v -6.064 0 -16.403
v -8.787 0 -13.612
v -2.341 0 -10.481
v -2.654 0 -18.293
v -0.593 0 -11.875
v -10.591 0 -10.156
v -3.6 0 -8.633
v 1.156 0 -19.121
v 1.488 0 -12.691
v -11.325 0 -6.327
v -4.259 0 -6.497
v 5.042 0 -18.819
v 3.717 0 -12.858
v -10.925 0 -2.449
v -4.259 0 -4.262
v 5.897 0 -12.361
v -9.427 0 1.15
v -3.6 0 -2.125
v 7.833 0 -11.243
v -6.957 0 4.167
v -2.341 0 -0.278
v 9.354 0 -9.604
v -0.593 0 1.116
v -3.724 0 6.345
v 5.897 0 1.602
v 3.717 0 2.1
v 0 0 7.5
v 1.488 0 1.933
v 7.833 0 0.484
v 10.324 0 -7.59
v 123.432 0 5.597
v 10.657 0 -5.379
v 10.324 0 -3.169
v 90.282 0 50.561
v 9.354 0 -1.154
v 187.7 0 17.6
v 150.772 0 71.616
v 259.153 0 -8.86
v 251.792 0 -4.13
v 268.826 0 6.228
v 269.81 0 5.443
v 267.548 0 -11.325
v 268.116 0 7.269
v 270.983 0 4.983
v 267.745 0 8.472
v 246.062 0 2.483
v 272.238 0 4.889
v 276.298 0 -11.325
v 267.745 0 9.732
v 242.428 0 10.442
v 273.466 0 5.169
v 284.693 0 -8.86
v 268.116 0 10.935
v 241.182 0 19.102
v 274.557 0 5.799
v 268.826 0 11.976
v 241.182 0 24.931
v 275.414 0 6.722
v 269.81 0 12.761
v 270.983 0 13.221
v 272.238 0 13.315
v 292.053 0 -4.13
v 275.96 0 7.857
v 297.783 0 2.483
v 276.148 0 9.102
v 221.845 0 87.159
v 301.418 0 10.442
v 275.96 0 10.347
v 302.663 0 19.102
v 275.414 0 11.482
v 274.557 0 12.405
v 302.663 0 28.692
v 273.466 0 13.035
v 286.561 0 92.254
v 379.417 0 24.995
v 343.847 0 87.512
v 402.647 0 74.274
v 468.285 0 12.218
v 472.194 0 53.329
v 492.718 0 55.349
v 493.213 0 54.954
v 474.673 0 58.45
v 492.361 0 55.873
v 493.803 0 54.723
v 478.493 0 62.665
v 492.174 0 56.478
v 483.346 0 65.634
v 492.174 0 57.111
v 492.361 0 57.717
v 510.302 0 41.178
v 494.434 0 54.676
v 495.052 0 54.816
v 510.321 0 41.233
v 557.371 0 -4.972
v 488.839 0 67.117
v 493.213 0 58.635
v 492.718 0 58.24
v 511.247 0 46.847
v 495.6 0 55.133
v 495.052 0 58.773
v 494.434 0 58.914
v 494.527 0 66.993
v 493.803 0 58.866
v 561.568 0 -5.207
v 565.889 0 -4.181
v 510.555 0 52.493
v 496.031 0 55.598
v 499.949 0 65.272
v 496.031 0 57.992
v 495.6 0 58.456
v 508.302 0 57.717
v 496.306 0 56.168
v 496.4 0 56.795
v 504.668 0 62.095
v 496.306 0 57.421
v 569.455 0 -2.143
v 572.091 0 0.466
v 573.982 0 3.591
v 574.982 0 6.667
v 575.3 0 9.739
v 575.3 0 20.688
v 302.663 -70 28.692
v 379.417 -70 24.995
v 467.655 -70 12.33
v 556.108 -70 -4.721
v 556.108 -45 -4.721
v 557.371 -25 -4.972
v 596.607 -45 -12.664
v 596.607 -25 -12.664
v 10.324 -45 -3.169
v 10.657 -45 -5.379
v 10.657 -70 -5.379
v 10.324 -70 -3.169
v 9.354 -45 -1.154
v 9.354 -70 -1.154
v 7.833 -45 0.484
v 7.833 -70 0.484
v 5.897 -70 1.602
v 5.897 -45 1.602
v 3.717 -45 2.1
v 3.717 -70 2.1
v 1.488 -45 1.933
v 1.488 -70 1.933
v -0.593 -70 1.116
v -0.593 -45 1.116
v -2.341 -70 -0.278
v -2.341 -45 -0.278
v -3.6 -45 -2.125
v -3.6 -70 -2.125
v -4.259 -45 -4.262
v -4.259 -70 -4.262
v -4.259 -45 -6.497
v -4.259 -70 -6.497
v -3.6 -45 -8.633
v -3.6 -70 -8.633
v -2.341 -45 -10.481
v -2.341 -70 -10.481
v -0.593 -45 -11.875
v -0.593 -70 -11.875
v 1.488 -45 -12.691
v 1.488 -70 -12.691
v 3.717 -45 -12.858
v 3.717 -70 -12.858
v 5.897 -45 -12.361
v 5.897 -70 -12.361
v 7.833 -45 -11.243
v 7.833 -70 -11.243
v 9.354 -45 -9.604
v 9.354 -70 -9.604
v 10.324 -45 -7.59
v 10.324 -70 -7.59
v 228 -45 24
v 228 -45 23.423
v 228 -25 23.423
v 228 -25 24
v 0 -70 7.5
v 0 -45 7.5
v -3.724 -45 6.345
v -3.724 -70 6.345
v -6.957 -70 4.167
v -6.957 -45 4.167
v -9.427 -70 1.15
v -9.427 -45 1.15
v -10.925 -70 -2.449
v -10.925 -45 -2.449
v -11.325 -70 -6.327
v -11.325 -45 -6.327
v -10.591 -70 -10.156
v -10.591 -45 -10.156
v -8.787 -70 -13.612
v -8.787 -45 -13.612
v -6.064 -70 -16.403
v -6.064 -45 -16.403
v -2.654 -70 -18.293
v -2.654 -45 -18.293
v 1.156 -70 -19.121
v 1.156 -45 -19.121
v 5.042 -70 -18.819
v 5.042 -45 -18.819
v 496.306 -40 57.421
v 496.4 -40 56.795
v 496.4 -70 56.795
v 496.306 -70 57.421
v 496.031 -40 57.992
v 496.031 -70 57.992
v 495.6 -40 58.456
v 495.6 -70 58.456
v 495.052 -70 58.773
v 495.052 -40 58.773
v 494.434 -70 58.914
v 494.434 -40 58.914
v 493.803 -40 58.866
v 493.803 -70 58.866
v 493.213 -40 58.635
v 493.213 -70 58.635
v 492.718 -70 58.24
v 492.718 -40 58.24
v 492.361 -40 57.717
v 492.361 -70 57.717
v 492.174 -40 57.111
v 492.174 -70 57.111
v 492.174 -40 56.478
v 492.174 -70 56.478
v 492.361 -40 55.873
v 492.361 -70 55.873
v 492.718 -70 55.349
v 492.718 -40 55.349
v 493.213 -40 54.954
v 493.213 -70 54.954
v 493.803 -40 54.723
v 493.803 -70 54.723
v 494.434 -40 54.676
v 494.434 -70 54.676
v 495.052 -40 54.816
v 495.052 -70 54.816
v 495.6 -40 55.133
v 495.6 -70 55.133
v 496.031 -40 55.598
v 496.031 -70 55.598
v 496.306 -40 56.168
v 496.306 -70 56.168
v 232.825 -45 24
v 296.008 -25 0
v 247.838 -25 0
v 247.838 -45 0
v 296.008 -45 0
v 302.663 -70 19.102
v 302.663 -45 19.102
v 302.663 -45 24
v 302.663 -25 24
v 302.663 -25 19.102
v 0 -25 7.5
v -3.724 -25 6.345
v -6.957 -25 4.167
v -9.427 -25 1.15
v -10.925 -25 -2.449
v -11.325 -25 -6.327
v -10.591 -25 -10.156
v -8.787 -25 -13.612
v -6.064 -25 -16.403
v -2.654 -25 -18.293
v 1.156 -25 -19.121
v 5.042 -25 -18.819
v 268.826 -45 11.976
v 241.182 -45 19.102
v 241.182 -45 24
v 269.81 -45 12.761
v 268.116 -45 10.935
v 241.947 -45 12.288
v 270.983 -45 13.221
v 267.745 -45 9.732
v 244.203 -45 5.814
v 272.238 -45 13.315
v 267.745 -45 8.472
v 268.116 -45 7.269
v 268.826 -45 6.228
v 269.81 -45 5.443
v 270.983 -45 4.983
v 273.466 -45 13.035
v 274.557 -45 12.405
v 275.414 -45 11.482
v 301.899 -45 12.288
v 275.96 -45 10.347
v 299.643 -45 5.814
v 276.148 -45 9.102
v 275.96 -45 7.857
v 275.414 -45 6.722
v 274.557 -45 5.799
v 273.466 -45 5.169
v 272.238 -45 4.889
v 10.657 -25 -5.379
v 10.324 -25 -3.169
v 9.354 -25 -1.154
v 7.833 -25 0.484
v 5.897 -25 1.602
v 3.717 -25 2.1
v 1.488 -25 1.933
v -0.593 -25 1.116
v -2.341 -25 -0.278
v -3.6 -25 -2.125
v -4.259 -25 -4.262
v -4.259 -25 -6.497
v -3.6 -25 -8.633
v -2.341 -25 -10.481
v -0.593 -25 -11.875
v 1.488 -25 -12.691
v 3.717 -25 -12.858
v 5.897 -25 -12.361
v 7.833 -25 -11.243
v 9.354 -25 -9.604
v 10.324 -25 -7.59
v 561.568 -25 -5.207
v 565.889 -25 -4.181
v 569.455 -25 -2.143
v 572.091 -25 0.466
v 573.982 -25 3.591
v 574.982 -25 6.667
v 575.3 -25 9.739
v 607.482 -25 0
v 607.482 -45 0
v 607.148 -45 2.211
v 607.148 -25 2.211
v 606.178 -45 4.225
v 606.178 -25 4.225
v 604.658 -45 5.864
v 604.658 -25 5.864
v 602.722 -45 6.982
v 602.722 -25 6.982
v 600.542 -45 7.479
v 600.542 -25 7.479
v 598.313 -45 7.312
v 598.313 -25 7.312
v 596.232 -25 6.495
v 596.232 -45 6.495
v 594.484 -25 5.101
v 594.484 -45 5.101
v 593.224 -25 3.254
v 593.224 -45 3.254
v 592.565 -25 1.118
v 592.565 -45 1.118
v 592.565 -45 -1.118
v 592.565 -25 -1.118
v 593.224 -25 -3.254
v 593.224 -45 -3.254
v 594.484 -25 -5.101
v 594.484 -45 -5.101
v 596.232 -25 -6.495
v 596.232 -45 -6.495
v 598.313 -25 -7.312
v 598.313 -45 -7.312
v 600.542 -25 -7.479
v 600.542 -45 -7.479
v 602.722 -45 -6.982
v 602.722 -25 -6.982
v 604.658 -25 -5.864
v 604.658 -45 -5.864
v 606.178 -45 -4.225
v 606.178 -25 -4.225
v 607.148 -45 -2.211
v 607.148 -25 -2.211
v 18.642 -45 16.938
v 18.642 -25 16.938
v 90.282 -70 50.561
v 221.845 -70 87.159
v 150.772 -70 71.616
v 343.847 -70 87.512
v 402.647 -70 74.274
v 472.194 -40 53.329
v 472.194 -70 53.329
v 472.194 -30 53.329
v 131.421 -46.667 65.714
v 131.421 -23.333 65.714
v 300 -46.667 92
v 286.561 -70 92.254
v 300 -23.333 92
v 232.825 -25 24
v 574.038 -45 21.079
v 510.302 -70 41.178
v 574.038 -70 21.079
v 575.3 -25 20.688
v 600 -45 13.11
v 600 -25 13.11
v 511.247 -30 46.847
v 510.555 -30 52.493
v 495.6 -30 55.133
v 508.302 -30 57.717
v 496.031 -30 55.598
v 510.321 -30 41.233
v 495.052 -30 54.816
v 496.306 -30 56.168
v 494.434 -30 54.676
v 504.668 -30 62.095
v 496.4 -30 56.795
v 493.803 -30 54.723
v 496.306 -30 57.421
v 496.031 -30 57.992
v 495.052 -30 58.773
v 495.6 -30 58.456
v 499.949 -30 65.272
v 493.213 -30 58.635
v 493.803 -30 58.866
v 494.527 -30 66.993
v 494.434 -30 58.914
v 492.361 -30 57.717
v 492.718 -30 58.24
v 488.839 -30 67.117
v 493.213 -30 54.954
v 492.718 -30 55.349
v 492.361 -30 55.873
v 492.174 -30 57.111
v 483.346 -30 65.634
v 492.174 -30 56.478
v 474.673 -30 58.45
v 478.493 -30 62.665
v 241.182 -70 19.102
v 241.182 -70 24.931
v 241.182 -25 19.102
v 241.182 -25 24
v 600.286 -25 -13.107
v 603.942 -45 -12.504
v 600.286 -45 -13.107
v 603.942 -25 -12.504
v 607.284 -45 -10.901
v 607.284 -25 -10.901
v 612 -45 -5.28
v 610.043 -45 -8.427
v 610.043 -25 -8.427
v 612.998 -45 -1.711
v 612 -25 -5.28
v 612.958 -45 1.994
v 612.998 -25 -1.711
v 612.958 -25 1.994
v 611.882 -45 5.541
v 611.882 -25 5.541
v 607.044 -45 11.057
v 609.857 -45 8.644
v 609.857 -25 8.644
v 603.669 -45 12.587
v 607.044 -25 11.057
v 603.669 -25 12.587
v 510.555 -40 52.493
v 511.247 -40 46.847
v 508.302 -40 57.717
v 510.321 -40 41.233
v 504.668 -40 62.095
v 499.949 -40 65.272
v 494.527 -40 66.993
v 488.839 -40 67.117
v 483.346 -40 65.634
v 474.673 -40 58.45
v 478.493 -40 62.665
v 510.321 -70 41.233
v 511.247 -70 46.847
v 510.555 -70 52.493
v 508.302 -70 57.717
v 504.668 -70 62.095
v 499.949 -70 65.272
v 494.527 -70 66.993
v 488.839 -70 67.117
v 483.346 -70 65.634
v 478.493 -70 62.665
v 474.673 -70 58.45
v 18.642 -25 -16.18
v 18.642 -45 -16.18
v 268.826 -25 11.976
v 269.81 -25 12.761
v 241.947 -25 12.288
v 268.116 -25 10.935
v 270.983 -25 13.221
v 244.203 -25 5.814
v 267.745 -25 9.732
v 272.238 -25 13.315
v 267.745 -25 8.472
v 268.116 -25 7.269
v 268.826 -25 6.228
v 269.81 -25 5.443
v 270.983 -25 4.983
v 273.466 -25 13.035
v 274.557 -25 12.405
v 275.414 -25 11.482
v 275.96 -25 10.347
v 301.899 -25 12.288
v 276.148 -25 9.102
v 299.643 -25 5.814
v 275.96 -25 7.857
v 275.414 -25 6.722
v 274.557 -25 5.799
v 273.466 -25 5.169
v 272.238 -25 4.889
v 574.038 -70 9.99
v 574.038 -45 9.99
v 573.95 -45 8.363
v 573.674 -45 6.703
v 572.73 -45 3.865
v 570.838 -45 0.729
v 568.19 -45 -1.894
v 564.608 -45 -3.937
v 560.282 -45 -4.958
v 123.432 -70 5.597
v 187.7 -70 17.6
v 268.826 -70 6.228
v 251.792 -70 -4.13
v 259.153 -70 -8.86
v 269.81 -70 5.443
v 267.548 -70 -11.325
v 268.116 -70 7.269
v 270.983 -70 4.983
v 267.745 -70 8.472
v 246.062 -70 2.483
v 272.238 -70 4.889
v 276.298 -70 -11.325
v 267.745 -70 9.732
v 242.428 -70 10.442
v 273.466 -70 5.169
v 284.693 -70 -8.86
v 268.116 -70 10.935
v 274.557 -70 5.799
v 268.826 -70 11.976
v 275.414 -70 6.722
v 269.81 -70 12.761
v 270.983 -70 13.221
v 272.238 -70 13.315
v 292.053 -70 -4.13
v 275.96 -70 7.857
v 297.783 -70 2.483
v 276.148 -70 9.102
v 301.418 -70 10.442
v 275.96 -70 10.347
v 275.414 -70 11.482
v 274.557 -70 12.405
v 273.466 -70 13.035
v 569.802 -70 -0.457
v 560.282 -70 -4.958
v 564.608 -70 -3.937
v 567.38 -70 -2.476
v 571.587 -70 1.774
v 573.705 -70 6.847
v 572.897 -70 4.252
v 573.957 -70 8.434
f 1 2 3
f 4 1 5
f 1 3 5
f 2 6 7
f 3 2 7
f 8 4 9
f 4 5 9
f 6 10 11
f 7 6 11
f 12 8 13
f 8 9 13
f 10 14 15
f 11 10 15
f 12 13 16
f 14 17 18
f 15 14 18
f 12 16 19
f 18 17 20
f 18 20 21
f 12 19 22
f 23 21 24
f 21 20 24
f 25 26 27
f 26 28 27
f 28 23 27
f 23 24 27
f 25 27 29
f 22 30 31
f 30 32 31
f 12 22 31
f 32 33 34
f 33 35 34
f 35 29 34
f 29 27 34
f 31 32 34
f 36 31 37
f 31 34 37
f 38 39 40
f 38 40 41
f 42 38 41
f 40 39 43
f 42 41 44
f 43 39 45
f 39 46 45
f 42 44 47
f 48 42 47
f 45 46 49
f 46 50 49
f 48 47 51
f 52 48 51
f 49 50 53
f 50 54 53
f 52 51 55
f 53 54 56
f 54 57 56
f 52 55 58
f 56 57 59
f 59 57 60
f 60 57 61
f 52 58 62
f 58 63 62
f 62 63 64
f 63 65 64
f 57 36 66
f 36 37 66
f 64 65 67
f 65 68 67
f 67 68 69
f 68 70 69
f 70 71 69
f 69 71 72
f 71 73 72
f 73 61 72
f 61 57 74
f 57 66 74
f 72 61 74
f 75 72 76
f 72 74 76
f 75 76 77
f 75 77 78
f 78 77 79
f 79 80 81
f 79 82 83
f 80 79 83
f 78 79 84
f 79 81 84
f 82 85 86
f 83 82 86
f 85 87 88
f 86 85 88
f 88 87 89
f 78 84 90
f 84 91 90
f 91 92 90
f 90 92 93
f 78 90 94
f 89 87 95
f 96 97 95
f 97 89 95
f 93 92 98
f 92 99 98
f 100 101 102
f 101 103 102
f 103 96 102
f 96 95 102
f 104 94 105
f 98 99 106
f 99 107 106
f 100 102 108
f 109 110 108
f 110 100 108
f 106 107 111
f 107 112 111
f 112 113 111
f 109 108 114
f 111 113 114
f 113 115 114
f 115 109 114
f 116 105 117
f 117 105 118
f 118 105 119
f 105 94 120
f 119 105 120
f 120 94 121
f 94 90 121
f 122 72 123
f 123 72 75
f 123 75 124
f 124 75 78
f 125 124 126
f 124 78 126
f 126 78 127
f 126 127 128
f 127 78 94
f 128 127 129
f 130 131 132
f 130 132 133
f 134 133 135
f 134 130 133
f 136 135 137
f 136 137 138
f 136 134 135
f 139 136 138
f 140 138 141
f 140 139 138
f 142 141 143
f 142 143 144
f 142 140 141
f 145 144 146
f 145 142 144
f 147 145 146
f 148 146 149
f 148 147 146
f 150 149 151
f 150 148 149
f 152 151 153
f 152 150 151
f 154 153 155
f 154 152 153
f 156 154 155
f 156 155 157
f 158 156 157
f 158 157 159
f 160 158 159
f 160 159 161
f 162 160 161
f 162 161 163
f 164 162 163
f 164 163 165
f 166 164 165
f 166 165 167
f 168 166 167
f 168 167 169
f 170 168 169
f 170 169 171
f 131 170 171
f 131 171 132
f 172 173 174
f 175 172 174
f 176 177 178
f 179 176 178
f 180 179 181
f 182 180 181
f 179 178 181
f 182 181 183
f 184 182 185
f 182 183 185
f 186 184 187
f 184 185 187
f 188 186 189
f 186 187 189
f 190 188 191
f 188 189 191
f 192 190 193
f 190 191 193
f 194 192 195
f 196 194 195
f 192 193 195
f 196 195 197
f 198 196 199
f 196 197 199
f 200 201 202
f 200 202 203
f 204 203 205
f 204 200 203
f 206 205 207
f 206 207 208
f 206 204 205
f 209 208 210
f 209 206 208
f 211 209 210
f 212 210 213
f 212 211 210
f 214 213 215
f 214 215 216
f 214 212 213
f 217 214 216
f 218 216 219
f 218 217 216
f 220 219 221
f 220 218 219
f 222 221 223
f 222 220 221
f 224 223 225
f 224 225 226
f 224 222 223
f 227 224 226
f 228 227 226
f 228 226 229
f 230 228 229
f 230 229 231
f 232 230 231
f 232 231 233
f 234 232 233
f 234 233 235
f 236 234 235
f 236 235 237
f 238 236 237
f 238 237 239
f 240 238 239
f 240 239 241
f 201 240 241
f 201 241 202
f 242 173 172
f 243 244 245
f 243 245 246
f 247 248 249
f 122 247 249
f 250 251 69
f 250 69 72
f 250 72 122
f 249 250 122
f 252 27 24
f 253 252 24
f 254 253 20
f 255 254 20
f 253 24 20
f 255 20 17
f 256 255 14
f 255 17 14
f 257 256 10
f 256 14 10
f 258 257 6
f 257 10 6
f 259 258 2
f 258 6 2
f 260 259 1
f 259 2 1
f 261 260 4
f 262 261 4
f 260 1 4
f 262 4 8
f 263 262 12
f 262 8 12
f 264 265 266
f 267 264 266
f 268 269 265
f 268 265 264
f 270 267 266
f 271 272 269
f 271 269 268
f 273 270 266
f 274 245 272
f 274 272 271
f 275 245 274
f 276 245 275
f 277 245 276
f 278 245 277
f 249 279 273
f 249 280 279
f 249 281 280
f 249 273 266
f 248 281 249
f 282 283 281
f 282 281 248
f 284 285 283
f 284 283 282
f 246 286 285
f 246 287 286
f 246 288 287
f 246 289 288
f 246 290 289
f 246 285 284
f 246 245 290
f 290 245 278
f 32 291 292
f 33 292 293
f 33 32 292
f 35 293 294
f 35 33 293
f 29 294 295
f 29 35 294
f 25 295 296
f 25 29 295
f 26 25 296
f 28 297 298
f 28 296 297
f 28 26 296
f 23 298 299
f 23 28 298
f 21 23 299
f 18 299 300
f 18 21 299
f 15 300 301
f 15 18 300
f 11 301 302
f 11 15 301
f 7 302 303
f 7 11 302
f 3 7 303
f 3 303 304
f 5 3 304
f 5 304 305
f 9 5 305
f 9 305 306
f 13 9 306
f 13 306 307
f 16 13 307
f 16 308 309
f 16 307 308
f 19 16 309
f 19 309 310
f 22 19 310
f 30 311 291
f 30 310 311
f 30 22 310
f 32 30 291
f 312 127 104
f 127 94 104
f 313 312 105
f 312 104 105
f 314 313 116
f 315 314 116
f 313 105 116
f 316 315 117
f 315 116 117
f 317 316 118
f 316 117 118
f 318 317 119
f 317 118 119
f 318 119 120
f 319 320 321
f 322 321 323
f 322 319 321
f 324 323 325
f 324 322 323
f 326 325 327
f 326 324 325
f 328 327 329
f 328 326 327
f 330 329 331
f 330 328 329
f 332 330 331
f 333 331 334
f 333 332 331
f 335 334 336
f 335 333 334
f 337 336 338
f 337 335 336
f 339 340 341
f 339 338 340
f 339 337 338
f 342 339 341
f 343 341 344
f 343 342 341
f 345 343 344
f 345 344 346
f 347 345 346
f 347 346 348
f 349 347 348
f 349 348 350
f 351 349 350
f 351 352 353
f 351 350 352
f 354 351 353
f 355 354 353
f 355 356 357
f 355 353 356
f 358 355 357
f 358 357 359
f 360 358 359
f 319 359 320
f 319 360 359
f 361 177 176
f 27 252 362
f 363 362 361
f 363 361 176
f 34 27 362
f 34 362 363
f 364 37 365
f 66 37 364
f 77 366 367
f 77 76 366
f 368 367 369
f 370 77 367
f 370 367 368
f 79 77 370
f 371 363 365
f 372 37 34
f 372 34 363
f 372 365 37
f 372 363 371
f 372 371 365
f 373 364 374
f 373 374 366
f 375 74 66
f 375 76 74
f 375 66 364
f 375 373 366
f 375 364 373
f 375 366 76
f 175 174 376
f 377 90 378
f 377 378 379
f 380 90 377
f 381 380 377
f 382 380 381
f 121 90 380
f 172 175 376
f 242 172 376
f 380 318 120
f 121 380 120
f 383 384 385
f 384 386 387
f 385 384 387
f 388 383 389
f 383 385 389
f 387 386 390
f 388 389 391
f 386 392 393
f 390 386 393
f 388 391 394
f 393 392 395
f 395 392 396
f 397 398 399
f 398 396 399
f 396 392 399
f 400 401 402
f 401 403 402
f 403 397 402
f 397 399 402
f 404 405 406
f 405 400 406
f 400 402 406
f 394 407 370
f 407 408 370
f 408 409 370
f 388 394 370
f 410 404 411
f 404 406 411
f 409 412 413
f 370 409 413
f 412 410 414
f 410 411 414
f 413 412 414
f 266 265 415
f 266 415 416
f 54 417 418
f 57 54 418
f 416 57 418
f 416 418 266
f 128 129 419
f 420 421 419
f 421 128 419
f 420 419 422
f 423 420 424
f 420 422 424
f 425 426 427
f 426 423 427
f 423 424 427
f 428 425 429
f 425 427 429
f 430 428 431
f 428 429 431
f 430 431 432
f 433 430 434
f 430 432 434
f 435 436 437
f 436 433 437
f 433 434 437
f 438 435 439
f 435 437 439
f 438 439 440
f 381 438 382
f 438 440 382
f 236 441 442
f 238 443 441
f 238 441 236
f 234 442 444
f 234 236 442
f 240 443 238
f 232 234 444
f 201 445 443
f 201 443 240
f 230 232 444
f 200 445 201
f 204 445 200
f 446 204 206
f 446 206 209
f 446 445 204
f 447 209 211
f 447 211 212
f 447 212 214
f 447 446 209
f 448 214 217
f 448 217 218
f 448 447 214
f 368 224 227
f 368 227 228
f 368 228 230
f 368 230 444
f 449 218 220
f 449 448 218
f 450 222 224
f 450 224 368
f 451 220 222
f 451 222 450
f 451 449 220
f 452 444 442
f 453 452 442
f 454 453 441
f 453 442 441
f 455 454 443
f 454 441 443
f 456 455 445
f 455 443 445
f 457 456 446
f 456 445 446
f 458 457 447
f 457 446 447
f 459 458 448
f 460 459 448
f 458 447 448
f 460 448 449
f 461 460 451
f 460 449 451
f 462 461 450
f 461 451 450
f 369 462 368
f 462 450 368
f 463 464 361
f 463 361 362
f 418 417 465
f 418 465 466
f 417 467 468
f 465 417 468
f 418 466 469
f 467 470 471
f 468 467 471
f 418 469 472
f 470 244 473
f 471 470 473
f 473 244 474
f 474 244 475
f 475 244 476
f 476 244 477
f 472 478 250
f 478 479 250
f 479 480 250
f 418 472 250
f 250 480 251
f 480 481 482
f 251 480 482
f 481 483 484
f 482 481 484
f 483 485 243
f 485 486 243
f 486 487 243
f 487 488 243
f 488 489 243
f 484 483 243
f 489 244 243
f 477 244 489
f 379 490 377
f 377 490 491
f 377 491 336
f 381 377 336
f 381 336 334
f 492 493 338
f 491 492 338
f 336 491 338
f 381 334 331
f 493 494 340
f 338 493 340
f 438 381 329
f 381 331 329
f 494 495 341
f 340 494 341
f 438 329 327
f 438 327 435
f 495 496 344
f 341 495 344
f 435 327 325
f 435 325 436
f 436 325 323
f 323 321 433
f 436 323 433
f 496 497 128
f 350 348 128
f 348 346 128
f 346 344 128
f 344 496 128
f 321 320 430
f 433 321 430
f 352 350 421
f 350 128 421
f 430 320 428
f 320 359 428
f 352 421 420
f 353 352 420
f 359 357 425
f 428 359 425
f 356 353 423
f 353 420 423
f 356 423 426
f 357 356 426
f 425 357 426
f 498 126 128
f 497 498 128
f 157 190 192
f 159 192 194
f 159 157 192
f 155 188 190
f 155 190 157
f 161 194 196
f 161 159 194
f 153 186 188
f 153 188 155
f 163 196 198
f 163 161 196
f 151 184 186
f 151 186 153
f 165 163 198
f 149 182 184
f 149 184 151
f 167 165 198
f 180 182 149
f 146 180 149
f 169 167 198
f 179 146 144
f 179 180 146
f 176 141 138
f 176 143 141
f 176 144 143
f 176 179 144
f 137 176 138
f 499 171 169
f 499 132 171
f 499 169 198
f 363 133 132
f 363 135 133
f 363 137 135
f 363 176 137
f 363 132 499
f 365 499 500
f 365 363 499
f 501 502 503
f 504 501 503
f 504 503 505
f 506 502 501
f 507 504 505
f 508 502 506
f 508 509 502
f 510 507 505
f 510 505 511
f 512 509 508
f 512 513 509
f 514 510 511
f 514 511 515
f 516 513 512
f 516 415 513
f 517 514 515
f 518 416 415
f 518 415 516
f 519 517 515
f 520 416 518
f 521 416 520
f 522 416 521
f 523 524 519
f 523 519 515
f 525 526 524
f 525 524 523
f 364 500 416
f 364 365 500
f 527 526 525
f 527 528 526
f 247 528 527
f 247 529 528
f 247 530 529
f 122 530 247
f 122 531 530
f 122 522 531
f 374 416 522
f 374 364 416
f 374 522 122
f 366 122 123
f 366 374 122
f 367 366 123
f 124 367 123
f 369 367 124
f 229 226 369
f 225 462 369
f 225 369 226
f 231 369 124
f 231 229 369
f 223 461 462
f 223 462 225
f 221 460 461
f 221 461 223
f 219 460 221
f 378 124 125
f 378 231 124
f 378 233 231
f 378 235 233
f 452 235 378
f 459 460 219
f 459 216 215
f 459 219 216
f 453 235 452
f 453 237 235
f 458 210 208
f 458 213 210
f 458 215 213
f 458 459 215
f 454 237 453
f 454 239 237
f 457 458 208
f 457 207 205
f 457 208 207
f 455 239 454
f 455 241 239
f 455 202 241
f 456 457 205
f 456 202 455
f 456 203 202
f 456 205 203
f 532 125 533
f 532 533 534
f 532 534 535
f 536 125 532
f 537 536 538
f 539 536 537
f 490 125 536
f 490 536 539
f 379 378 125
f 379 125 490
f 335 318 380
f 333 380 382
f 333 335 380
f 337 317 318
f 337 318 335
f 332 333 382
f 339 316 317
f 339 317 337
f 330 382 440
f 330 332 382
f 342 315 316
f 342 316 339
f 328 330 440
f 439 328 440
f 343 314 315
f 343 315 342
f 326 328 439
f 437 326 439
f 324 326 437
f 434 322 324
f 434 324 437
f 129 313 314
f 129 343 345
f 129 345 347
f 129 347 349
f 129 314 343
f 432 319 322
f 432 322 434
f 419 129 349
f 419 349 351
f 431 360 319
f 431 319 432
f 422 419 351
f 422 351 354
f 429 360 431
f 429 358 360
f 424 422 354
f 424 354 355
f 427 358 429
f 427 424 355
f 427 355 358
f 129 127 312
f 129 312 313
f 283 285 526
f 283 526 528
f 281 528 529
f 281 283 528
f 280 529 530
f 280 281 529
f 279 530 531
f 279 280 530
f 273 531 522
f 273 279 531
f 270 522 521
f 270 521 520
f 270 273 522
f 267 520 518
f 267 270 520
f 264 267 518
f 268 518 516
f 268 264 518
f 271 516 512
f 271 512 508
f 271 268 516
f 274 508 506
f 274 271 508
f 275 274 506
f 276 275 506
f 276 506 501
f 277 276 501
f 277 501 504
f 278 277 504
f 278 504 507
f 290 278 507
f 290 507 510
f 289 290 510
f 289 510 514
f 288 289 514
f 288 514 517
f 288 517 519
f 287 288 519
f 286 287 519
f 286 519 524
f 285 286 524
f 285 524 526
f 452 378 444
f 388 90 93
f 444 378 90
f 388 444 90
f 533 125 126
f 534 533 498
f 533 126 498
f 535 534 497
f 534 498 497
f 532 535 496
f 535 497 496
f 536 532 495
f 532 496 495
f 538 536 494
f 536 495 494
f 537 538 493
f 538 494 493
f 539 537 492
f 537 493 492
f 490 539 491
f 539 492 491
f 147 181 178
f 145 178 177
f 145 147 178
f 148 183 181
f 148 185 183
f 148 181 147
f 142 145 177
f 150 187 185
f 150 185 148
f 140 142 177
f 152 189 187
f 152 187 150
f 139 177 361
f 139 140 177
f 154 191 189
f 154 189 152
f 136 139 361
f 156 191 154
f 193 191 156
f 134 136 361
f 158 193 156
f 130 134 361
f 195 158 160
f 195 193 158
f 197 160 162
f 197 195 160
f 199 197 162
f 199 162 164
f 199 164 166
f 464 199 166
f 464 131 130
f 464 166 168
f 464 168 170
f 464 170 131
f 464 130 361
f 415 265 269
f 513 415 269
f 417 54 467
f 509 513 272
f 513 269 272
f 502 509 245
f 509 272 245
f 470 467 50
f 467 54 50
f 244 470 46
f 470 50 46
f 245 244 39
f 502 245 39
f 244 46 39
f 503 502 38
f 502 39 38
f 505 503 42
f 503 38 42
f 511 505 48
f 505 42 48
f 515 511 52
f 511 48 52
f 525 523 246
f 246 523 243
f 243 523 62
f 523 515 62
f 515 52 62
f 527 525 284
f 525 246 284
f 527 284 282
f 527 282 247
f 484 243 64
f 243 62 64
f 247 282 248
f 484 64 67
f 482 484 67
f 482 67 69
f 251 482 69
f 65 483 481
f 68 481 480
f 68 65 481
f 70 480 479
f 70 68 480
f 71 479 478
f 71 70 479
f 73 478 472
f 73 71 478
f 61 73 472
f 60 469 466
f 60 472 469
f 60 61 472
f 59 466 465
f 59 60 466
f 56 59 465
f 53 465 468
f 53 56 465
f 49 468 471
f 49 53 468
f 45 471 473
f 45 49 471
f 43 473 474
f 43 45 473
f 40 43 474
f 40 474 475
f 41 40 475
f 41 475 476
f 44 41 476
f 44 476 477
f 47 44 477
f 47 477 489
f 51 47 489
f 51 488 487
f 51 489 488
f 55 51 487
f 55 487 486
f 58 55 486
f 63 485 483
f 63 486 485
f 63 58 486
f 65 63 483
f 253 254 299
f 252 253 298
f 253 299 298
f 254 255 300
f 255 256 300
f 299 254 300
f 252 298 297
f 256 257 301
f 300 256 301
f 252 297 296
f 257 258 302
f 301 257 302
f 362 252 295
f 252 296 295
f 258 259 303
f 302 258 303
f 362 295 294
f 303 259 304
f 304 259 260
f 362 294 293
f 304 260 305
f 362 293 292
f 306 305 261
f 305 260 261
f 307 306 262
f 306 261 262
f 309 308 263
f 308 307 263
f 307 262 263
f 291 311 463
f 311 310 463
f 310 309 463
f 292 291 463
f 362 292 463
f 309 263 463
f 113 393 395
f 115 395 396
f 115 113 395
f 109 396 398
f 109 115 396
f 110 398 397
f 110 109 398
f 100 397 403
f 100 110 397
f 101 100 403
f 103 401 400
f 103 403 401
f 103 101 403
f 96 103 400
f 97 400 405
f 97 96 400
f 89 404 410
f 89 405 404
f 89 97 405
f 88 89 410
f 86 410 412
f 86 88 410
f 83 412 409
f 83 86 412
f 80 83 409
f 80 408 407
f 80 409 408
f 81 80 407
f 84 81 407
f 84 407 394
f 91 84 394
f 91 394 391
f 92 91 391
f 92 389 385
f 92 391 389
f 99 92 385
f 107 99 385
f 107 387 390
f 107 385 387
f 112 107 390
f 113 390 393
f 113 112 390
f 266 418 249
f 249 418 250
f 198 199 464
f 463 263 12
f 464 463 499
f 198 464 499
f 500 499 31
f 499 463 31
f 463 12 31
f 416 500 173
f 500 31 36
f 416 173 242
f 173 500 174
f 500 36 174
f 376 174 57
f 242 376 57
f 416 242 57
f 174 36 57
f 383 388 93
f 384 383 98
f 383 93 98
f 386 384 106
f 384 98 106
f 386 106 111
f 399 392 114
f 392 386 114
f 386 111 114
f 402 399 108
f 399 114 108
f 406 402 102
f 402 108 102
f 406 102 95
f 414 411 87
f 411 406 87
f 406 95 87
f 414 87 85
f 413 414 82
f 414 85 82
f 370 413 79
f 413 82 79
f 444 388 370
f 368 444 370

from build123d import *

# Parameters (mm, degrees)
F1_DEPTH      = 70
F2_R          = 7.5
F3_DEPTH      = 70
F4_W          = 38.3359060888
F4_H          = 25
F4_W_2        = 39.5979748373
F4_W_3        = 30.4998038337
F4_H_2        = 20
F5_DEPTH      = 25
F5_DEPTH_BACK = 25
F6_R          = 15
F7_W          = 61.4808317696
F7_H          = 11.3357962312
F7_R          = 4.225
F8_DEPTH      = 70
F9_W          = 100
F9_H          = 20
F10_DEPTH     = 24
F11_R         = 2.125
F12_DEPTH     = 70
F14_R         = 2.125
F15_DEPTH     = 10


with BuildPart() as f1:
    # F0 (on Front) → F1 (new body)
    with BuildSketch(Plane.XZ):
        with BuildLine():
            add(Edge.make_bspline(
                [(0, 7.5), (50.3453426063, 33.0532751977), (124.5695498707, 70.4313359242), (325.5609958993, 110.9176804755), (447.3313093185, 59.5129579306), (600, 13.1103944731)],
                knots=[0, 0, 0, 0, 0.281013924, 0.5871772284, 1, 1, 1, 1], degree=3))
            ThreePointArc((0, 7.5), (-11.0976940951, -8.2685881847), (5.0424365564, -18.8186294225))
            add(Edge.make_bspline(
                [(5.0424365564, -18.8186294225), (104.1736466206, 0.0529713977), (299.4595954862, 54.136097737), (497.3786234374, 6.3046680419), (596.6067802216, -12.6636686144)],
                knots=[0, 0, 0, 0, 0.4997002441, 1, 1, 1, 1], degree=3))
            ThreePointArc((596.6067802216, -12.6636686144), (612.9982332309, -1.7112498691), (600, 13.1103944731))
        make_face()
    extrude(amount=F1_DEPTH)

    # F2 (on Front) → F3 (cut)
    with BuildSketch(Plane.XZ):
        with Locations((3.1568240374, -5.3793457337)):
            Circle(F2_R)
        with Locations((599.981546402, 0)):
            Circle(F2_R)
    extrude(amount=F3_DEPTH, mode=Mode.SUBTRACT)

    # F4 (on Top) → F5 (cut, two sides)
    with BuildSketch(Plane.XY) as f5_sk:
        with Locations((594.4681697192, -12.5)):
            Rectangle(F4_W, F4_H)
        with Locations((593.837135345, -57.5)):
            Rectangle(F4_W_2, F4_H)
        with Locations((3.3916295506, -35)):
            Rectangle(F4_W_3, F4_H_2)
    extrude(amount=-F5_DEPTH, mode=Mode.SUBTRACT)
    extrude(f5_sk.sketch, amount=F5_DEPTH_BACK, mode=Mode.SUBTRACT)

    # F6
    f6_edges = [f1.edges().sort_by_distance(p)[0] for p in [
        (574.038148, -57.5, -8.276448),
        (575.300217, -12.5, -8.524983),
    ]]
    fillet(f6_edges, radius=F6_R)

    # F7 (on Front) → F8 (join)
    with BuildSketch(Plane.XZ):
        with Locations((271.9227431553, 24.7699965359)):
            Rectangle(F7_W, F7_H)
        with BuildLine():
            Line((302.6631590401, 19.1020984203), (241.1823272705, 19.1020984203))
            ThreePointArc((241.1823272705, 19.1020984203), (271.9227431553, -11.6383174646), (302.6631590401, 19.1020984203))
        make_face()
        with Locations((271.9227431553, 9.1020984203)):
            Circle(F7_R, mode=Mode.SUBTRACT)
    extrude(amount=F8_DEPTH)

    # F9 (on Top) → F10 (cut)
    with BuildSketch(Plane.XY):
        with Locations((278, -35)):
            Rectangle(F9_W, F9_H)
    extrude(amount=F10_DEPTH, mode=Mode.SUBTRACT)

    # F11 (on Front) → F12 (join)
    with BuildSketch(Plane.XZ):
        with BuildLine():
            Line((472.1937120855, 53.3293670855), (510.3209194065, 41.2333121589))
            ThreePointArc((510.3209194065, 41.2333121589), (497.2994567763, 66.3263890307), (472.1937120855, 53.3293670855))
        make_face()
        with Locations((494.275441611, 56.7945826814)):
            Circle(F11_R, mode=Mode.SUBTRACT)
        Polygon((509.0549868975, 37.4887385523), (510.3209194065, 41.2333121589), (472.1937120855, 53.3293670855), (471.0067243804, 49.6005392228), align=None)
    extrude(amount=F12_DEPTH)

    # F14 (on offset) → F15 (cut)
    with BuildSketch(Plane(origin=(0, -30, 0), x_dir=(-1, 0, 0), z_dir=(0, 1, 0))):
        with BuildLine():
            ThreePointArc((-472.1937120855, 53.3293670855), (-497.2994567763, 66.3263890307), (-510.3209194065, 41.2333121589))
            Line((-510.3209194065, 41.2333121589), (-472.1937120855, 53.3293670855))
        make_face()
        with Locations((-494.275441611, 56.7945826814)):
            Circle(F14_R, mode=Mode.SUBTRACT)
    extrude(amount=-F15_DEPTH, mode=Mode.SUBTRACT)


solid = f1.part
